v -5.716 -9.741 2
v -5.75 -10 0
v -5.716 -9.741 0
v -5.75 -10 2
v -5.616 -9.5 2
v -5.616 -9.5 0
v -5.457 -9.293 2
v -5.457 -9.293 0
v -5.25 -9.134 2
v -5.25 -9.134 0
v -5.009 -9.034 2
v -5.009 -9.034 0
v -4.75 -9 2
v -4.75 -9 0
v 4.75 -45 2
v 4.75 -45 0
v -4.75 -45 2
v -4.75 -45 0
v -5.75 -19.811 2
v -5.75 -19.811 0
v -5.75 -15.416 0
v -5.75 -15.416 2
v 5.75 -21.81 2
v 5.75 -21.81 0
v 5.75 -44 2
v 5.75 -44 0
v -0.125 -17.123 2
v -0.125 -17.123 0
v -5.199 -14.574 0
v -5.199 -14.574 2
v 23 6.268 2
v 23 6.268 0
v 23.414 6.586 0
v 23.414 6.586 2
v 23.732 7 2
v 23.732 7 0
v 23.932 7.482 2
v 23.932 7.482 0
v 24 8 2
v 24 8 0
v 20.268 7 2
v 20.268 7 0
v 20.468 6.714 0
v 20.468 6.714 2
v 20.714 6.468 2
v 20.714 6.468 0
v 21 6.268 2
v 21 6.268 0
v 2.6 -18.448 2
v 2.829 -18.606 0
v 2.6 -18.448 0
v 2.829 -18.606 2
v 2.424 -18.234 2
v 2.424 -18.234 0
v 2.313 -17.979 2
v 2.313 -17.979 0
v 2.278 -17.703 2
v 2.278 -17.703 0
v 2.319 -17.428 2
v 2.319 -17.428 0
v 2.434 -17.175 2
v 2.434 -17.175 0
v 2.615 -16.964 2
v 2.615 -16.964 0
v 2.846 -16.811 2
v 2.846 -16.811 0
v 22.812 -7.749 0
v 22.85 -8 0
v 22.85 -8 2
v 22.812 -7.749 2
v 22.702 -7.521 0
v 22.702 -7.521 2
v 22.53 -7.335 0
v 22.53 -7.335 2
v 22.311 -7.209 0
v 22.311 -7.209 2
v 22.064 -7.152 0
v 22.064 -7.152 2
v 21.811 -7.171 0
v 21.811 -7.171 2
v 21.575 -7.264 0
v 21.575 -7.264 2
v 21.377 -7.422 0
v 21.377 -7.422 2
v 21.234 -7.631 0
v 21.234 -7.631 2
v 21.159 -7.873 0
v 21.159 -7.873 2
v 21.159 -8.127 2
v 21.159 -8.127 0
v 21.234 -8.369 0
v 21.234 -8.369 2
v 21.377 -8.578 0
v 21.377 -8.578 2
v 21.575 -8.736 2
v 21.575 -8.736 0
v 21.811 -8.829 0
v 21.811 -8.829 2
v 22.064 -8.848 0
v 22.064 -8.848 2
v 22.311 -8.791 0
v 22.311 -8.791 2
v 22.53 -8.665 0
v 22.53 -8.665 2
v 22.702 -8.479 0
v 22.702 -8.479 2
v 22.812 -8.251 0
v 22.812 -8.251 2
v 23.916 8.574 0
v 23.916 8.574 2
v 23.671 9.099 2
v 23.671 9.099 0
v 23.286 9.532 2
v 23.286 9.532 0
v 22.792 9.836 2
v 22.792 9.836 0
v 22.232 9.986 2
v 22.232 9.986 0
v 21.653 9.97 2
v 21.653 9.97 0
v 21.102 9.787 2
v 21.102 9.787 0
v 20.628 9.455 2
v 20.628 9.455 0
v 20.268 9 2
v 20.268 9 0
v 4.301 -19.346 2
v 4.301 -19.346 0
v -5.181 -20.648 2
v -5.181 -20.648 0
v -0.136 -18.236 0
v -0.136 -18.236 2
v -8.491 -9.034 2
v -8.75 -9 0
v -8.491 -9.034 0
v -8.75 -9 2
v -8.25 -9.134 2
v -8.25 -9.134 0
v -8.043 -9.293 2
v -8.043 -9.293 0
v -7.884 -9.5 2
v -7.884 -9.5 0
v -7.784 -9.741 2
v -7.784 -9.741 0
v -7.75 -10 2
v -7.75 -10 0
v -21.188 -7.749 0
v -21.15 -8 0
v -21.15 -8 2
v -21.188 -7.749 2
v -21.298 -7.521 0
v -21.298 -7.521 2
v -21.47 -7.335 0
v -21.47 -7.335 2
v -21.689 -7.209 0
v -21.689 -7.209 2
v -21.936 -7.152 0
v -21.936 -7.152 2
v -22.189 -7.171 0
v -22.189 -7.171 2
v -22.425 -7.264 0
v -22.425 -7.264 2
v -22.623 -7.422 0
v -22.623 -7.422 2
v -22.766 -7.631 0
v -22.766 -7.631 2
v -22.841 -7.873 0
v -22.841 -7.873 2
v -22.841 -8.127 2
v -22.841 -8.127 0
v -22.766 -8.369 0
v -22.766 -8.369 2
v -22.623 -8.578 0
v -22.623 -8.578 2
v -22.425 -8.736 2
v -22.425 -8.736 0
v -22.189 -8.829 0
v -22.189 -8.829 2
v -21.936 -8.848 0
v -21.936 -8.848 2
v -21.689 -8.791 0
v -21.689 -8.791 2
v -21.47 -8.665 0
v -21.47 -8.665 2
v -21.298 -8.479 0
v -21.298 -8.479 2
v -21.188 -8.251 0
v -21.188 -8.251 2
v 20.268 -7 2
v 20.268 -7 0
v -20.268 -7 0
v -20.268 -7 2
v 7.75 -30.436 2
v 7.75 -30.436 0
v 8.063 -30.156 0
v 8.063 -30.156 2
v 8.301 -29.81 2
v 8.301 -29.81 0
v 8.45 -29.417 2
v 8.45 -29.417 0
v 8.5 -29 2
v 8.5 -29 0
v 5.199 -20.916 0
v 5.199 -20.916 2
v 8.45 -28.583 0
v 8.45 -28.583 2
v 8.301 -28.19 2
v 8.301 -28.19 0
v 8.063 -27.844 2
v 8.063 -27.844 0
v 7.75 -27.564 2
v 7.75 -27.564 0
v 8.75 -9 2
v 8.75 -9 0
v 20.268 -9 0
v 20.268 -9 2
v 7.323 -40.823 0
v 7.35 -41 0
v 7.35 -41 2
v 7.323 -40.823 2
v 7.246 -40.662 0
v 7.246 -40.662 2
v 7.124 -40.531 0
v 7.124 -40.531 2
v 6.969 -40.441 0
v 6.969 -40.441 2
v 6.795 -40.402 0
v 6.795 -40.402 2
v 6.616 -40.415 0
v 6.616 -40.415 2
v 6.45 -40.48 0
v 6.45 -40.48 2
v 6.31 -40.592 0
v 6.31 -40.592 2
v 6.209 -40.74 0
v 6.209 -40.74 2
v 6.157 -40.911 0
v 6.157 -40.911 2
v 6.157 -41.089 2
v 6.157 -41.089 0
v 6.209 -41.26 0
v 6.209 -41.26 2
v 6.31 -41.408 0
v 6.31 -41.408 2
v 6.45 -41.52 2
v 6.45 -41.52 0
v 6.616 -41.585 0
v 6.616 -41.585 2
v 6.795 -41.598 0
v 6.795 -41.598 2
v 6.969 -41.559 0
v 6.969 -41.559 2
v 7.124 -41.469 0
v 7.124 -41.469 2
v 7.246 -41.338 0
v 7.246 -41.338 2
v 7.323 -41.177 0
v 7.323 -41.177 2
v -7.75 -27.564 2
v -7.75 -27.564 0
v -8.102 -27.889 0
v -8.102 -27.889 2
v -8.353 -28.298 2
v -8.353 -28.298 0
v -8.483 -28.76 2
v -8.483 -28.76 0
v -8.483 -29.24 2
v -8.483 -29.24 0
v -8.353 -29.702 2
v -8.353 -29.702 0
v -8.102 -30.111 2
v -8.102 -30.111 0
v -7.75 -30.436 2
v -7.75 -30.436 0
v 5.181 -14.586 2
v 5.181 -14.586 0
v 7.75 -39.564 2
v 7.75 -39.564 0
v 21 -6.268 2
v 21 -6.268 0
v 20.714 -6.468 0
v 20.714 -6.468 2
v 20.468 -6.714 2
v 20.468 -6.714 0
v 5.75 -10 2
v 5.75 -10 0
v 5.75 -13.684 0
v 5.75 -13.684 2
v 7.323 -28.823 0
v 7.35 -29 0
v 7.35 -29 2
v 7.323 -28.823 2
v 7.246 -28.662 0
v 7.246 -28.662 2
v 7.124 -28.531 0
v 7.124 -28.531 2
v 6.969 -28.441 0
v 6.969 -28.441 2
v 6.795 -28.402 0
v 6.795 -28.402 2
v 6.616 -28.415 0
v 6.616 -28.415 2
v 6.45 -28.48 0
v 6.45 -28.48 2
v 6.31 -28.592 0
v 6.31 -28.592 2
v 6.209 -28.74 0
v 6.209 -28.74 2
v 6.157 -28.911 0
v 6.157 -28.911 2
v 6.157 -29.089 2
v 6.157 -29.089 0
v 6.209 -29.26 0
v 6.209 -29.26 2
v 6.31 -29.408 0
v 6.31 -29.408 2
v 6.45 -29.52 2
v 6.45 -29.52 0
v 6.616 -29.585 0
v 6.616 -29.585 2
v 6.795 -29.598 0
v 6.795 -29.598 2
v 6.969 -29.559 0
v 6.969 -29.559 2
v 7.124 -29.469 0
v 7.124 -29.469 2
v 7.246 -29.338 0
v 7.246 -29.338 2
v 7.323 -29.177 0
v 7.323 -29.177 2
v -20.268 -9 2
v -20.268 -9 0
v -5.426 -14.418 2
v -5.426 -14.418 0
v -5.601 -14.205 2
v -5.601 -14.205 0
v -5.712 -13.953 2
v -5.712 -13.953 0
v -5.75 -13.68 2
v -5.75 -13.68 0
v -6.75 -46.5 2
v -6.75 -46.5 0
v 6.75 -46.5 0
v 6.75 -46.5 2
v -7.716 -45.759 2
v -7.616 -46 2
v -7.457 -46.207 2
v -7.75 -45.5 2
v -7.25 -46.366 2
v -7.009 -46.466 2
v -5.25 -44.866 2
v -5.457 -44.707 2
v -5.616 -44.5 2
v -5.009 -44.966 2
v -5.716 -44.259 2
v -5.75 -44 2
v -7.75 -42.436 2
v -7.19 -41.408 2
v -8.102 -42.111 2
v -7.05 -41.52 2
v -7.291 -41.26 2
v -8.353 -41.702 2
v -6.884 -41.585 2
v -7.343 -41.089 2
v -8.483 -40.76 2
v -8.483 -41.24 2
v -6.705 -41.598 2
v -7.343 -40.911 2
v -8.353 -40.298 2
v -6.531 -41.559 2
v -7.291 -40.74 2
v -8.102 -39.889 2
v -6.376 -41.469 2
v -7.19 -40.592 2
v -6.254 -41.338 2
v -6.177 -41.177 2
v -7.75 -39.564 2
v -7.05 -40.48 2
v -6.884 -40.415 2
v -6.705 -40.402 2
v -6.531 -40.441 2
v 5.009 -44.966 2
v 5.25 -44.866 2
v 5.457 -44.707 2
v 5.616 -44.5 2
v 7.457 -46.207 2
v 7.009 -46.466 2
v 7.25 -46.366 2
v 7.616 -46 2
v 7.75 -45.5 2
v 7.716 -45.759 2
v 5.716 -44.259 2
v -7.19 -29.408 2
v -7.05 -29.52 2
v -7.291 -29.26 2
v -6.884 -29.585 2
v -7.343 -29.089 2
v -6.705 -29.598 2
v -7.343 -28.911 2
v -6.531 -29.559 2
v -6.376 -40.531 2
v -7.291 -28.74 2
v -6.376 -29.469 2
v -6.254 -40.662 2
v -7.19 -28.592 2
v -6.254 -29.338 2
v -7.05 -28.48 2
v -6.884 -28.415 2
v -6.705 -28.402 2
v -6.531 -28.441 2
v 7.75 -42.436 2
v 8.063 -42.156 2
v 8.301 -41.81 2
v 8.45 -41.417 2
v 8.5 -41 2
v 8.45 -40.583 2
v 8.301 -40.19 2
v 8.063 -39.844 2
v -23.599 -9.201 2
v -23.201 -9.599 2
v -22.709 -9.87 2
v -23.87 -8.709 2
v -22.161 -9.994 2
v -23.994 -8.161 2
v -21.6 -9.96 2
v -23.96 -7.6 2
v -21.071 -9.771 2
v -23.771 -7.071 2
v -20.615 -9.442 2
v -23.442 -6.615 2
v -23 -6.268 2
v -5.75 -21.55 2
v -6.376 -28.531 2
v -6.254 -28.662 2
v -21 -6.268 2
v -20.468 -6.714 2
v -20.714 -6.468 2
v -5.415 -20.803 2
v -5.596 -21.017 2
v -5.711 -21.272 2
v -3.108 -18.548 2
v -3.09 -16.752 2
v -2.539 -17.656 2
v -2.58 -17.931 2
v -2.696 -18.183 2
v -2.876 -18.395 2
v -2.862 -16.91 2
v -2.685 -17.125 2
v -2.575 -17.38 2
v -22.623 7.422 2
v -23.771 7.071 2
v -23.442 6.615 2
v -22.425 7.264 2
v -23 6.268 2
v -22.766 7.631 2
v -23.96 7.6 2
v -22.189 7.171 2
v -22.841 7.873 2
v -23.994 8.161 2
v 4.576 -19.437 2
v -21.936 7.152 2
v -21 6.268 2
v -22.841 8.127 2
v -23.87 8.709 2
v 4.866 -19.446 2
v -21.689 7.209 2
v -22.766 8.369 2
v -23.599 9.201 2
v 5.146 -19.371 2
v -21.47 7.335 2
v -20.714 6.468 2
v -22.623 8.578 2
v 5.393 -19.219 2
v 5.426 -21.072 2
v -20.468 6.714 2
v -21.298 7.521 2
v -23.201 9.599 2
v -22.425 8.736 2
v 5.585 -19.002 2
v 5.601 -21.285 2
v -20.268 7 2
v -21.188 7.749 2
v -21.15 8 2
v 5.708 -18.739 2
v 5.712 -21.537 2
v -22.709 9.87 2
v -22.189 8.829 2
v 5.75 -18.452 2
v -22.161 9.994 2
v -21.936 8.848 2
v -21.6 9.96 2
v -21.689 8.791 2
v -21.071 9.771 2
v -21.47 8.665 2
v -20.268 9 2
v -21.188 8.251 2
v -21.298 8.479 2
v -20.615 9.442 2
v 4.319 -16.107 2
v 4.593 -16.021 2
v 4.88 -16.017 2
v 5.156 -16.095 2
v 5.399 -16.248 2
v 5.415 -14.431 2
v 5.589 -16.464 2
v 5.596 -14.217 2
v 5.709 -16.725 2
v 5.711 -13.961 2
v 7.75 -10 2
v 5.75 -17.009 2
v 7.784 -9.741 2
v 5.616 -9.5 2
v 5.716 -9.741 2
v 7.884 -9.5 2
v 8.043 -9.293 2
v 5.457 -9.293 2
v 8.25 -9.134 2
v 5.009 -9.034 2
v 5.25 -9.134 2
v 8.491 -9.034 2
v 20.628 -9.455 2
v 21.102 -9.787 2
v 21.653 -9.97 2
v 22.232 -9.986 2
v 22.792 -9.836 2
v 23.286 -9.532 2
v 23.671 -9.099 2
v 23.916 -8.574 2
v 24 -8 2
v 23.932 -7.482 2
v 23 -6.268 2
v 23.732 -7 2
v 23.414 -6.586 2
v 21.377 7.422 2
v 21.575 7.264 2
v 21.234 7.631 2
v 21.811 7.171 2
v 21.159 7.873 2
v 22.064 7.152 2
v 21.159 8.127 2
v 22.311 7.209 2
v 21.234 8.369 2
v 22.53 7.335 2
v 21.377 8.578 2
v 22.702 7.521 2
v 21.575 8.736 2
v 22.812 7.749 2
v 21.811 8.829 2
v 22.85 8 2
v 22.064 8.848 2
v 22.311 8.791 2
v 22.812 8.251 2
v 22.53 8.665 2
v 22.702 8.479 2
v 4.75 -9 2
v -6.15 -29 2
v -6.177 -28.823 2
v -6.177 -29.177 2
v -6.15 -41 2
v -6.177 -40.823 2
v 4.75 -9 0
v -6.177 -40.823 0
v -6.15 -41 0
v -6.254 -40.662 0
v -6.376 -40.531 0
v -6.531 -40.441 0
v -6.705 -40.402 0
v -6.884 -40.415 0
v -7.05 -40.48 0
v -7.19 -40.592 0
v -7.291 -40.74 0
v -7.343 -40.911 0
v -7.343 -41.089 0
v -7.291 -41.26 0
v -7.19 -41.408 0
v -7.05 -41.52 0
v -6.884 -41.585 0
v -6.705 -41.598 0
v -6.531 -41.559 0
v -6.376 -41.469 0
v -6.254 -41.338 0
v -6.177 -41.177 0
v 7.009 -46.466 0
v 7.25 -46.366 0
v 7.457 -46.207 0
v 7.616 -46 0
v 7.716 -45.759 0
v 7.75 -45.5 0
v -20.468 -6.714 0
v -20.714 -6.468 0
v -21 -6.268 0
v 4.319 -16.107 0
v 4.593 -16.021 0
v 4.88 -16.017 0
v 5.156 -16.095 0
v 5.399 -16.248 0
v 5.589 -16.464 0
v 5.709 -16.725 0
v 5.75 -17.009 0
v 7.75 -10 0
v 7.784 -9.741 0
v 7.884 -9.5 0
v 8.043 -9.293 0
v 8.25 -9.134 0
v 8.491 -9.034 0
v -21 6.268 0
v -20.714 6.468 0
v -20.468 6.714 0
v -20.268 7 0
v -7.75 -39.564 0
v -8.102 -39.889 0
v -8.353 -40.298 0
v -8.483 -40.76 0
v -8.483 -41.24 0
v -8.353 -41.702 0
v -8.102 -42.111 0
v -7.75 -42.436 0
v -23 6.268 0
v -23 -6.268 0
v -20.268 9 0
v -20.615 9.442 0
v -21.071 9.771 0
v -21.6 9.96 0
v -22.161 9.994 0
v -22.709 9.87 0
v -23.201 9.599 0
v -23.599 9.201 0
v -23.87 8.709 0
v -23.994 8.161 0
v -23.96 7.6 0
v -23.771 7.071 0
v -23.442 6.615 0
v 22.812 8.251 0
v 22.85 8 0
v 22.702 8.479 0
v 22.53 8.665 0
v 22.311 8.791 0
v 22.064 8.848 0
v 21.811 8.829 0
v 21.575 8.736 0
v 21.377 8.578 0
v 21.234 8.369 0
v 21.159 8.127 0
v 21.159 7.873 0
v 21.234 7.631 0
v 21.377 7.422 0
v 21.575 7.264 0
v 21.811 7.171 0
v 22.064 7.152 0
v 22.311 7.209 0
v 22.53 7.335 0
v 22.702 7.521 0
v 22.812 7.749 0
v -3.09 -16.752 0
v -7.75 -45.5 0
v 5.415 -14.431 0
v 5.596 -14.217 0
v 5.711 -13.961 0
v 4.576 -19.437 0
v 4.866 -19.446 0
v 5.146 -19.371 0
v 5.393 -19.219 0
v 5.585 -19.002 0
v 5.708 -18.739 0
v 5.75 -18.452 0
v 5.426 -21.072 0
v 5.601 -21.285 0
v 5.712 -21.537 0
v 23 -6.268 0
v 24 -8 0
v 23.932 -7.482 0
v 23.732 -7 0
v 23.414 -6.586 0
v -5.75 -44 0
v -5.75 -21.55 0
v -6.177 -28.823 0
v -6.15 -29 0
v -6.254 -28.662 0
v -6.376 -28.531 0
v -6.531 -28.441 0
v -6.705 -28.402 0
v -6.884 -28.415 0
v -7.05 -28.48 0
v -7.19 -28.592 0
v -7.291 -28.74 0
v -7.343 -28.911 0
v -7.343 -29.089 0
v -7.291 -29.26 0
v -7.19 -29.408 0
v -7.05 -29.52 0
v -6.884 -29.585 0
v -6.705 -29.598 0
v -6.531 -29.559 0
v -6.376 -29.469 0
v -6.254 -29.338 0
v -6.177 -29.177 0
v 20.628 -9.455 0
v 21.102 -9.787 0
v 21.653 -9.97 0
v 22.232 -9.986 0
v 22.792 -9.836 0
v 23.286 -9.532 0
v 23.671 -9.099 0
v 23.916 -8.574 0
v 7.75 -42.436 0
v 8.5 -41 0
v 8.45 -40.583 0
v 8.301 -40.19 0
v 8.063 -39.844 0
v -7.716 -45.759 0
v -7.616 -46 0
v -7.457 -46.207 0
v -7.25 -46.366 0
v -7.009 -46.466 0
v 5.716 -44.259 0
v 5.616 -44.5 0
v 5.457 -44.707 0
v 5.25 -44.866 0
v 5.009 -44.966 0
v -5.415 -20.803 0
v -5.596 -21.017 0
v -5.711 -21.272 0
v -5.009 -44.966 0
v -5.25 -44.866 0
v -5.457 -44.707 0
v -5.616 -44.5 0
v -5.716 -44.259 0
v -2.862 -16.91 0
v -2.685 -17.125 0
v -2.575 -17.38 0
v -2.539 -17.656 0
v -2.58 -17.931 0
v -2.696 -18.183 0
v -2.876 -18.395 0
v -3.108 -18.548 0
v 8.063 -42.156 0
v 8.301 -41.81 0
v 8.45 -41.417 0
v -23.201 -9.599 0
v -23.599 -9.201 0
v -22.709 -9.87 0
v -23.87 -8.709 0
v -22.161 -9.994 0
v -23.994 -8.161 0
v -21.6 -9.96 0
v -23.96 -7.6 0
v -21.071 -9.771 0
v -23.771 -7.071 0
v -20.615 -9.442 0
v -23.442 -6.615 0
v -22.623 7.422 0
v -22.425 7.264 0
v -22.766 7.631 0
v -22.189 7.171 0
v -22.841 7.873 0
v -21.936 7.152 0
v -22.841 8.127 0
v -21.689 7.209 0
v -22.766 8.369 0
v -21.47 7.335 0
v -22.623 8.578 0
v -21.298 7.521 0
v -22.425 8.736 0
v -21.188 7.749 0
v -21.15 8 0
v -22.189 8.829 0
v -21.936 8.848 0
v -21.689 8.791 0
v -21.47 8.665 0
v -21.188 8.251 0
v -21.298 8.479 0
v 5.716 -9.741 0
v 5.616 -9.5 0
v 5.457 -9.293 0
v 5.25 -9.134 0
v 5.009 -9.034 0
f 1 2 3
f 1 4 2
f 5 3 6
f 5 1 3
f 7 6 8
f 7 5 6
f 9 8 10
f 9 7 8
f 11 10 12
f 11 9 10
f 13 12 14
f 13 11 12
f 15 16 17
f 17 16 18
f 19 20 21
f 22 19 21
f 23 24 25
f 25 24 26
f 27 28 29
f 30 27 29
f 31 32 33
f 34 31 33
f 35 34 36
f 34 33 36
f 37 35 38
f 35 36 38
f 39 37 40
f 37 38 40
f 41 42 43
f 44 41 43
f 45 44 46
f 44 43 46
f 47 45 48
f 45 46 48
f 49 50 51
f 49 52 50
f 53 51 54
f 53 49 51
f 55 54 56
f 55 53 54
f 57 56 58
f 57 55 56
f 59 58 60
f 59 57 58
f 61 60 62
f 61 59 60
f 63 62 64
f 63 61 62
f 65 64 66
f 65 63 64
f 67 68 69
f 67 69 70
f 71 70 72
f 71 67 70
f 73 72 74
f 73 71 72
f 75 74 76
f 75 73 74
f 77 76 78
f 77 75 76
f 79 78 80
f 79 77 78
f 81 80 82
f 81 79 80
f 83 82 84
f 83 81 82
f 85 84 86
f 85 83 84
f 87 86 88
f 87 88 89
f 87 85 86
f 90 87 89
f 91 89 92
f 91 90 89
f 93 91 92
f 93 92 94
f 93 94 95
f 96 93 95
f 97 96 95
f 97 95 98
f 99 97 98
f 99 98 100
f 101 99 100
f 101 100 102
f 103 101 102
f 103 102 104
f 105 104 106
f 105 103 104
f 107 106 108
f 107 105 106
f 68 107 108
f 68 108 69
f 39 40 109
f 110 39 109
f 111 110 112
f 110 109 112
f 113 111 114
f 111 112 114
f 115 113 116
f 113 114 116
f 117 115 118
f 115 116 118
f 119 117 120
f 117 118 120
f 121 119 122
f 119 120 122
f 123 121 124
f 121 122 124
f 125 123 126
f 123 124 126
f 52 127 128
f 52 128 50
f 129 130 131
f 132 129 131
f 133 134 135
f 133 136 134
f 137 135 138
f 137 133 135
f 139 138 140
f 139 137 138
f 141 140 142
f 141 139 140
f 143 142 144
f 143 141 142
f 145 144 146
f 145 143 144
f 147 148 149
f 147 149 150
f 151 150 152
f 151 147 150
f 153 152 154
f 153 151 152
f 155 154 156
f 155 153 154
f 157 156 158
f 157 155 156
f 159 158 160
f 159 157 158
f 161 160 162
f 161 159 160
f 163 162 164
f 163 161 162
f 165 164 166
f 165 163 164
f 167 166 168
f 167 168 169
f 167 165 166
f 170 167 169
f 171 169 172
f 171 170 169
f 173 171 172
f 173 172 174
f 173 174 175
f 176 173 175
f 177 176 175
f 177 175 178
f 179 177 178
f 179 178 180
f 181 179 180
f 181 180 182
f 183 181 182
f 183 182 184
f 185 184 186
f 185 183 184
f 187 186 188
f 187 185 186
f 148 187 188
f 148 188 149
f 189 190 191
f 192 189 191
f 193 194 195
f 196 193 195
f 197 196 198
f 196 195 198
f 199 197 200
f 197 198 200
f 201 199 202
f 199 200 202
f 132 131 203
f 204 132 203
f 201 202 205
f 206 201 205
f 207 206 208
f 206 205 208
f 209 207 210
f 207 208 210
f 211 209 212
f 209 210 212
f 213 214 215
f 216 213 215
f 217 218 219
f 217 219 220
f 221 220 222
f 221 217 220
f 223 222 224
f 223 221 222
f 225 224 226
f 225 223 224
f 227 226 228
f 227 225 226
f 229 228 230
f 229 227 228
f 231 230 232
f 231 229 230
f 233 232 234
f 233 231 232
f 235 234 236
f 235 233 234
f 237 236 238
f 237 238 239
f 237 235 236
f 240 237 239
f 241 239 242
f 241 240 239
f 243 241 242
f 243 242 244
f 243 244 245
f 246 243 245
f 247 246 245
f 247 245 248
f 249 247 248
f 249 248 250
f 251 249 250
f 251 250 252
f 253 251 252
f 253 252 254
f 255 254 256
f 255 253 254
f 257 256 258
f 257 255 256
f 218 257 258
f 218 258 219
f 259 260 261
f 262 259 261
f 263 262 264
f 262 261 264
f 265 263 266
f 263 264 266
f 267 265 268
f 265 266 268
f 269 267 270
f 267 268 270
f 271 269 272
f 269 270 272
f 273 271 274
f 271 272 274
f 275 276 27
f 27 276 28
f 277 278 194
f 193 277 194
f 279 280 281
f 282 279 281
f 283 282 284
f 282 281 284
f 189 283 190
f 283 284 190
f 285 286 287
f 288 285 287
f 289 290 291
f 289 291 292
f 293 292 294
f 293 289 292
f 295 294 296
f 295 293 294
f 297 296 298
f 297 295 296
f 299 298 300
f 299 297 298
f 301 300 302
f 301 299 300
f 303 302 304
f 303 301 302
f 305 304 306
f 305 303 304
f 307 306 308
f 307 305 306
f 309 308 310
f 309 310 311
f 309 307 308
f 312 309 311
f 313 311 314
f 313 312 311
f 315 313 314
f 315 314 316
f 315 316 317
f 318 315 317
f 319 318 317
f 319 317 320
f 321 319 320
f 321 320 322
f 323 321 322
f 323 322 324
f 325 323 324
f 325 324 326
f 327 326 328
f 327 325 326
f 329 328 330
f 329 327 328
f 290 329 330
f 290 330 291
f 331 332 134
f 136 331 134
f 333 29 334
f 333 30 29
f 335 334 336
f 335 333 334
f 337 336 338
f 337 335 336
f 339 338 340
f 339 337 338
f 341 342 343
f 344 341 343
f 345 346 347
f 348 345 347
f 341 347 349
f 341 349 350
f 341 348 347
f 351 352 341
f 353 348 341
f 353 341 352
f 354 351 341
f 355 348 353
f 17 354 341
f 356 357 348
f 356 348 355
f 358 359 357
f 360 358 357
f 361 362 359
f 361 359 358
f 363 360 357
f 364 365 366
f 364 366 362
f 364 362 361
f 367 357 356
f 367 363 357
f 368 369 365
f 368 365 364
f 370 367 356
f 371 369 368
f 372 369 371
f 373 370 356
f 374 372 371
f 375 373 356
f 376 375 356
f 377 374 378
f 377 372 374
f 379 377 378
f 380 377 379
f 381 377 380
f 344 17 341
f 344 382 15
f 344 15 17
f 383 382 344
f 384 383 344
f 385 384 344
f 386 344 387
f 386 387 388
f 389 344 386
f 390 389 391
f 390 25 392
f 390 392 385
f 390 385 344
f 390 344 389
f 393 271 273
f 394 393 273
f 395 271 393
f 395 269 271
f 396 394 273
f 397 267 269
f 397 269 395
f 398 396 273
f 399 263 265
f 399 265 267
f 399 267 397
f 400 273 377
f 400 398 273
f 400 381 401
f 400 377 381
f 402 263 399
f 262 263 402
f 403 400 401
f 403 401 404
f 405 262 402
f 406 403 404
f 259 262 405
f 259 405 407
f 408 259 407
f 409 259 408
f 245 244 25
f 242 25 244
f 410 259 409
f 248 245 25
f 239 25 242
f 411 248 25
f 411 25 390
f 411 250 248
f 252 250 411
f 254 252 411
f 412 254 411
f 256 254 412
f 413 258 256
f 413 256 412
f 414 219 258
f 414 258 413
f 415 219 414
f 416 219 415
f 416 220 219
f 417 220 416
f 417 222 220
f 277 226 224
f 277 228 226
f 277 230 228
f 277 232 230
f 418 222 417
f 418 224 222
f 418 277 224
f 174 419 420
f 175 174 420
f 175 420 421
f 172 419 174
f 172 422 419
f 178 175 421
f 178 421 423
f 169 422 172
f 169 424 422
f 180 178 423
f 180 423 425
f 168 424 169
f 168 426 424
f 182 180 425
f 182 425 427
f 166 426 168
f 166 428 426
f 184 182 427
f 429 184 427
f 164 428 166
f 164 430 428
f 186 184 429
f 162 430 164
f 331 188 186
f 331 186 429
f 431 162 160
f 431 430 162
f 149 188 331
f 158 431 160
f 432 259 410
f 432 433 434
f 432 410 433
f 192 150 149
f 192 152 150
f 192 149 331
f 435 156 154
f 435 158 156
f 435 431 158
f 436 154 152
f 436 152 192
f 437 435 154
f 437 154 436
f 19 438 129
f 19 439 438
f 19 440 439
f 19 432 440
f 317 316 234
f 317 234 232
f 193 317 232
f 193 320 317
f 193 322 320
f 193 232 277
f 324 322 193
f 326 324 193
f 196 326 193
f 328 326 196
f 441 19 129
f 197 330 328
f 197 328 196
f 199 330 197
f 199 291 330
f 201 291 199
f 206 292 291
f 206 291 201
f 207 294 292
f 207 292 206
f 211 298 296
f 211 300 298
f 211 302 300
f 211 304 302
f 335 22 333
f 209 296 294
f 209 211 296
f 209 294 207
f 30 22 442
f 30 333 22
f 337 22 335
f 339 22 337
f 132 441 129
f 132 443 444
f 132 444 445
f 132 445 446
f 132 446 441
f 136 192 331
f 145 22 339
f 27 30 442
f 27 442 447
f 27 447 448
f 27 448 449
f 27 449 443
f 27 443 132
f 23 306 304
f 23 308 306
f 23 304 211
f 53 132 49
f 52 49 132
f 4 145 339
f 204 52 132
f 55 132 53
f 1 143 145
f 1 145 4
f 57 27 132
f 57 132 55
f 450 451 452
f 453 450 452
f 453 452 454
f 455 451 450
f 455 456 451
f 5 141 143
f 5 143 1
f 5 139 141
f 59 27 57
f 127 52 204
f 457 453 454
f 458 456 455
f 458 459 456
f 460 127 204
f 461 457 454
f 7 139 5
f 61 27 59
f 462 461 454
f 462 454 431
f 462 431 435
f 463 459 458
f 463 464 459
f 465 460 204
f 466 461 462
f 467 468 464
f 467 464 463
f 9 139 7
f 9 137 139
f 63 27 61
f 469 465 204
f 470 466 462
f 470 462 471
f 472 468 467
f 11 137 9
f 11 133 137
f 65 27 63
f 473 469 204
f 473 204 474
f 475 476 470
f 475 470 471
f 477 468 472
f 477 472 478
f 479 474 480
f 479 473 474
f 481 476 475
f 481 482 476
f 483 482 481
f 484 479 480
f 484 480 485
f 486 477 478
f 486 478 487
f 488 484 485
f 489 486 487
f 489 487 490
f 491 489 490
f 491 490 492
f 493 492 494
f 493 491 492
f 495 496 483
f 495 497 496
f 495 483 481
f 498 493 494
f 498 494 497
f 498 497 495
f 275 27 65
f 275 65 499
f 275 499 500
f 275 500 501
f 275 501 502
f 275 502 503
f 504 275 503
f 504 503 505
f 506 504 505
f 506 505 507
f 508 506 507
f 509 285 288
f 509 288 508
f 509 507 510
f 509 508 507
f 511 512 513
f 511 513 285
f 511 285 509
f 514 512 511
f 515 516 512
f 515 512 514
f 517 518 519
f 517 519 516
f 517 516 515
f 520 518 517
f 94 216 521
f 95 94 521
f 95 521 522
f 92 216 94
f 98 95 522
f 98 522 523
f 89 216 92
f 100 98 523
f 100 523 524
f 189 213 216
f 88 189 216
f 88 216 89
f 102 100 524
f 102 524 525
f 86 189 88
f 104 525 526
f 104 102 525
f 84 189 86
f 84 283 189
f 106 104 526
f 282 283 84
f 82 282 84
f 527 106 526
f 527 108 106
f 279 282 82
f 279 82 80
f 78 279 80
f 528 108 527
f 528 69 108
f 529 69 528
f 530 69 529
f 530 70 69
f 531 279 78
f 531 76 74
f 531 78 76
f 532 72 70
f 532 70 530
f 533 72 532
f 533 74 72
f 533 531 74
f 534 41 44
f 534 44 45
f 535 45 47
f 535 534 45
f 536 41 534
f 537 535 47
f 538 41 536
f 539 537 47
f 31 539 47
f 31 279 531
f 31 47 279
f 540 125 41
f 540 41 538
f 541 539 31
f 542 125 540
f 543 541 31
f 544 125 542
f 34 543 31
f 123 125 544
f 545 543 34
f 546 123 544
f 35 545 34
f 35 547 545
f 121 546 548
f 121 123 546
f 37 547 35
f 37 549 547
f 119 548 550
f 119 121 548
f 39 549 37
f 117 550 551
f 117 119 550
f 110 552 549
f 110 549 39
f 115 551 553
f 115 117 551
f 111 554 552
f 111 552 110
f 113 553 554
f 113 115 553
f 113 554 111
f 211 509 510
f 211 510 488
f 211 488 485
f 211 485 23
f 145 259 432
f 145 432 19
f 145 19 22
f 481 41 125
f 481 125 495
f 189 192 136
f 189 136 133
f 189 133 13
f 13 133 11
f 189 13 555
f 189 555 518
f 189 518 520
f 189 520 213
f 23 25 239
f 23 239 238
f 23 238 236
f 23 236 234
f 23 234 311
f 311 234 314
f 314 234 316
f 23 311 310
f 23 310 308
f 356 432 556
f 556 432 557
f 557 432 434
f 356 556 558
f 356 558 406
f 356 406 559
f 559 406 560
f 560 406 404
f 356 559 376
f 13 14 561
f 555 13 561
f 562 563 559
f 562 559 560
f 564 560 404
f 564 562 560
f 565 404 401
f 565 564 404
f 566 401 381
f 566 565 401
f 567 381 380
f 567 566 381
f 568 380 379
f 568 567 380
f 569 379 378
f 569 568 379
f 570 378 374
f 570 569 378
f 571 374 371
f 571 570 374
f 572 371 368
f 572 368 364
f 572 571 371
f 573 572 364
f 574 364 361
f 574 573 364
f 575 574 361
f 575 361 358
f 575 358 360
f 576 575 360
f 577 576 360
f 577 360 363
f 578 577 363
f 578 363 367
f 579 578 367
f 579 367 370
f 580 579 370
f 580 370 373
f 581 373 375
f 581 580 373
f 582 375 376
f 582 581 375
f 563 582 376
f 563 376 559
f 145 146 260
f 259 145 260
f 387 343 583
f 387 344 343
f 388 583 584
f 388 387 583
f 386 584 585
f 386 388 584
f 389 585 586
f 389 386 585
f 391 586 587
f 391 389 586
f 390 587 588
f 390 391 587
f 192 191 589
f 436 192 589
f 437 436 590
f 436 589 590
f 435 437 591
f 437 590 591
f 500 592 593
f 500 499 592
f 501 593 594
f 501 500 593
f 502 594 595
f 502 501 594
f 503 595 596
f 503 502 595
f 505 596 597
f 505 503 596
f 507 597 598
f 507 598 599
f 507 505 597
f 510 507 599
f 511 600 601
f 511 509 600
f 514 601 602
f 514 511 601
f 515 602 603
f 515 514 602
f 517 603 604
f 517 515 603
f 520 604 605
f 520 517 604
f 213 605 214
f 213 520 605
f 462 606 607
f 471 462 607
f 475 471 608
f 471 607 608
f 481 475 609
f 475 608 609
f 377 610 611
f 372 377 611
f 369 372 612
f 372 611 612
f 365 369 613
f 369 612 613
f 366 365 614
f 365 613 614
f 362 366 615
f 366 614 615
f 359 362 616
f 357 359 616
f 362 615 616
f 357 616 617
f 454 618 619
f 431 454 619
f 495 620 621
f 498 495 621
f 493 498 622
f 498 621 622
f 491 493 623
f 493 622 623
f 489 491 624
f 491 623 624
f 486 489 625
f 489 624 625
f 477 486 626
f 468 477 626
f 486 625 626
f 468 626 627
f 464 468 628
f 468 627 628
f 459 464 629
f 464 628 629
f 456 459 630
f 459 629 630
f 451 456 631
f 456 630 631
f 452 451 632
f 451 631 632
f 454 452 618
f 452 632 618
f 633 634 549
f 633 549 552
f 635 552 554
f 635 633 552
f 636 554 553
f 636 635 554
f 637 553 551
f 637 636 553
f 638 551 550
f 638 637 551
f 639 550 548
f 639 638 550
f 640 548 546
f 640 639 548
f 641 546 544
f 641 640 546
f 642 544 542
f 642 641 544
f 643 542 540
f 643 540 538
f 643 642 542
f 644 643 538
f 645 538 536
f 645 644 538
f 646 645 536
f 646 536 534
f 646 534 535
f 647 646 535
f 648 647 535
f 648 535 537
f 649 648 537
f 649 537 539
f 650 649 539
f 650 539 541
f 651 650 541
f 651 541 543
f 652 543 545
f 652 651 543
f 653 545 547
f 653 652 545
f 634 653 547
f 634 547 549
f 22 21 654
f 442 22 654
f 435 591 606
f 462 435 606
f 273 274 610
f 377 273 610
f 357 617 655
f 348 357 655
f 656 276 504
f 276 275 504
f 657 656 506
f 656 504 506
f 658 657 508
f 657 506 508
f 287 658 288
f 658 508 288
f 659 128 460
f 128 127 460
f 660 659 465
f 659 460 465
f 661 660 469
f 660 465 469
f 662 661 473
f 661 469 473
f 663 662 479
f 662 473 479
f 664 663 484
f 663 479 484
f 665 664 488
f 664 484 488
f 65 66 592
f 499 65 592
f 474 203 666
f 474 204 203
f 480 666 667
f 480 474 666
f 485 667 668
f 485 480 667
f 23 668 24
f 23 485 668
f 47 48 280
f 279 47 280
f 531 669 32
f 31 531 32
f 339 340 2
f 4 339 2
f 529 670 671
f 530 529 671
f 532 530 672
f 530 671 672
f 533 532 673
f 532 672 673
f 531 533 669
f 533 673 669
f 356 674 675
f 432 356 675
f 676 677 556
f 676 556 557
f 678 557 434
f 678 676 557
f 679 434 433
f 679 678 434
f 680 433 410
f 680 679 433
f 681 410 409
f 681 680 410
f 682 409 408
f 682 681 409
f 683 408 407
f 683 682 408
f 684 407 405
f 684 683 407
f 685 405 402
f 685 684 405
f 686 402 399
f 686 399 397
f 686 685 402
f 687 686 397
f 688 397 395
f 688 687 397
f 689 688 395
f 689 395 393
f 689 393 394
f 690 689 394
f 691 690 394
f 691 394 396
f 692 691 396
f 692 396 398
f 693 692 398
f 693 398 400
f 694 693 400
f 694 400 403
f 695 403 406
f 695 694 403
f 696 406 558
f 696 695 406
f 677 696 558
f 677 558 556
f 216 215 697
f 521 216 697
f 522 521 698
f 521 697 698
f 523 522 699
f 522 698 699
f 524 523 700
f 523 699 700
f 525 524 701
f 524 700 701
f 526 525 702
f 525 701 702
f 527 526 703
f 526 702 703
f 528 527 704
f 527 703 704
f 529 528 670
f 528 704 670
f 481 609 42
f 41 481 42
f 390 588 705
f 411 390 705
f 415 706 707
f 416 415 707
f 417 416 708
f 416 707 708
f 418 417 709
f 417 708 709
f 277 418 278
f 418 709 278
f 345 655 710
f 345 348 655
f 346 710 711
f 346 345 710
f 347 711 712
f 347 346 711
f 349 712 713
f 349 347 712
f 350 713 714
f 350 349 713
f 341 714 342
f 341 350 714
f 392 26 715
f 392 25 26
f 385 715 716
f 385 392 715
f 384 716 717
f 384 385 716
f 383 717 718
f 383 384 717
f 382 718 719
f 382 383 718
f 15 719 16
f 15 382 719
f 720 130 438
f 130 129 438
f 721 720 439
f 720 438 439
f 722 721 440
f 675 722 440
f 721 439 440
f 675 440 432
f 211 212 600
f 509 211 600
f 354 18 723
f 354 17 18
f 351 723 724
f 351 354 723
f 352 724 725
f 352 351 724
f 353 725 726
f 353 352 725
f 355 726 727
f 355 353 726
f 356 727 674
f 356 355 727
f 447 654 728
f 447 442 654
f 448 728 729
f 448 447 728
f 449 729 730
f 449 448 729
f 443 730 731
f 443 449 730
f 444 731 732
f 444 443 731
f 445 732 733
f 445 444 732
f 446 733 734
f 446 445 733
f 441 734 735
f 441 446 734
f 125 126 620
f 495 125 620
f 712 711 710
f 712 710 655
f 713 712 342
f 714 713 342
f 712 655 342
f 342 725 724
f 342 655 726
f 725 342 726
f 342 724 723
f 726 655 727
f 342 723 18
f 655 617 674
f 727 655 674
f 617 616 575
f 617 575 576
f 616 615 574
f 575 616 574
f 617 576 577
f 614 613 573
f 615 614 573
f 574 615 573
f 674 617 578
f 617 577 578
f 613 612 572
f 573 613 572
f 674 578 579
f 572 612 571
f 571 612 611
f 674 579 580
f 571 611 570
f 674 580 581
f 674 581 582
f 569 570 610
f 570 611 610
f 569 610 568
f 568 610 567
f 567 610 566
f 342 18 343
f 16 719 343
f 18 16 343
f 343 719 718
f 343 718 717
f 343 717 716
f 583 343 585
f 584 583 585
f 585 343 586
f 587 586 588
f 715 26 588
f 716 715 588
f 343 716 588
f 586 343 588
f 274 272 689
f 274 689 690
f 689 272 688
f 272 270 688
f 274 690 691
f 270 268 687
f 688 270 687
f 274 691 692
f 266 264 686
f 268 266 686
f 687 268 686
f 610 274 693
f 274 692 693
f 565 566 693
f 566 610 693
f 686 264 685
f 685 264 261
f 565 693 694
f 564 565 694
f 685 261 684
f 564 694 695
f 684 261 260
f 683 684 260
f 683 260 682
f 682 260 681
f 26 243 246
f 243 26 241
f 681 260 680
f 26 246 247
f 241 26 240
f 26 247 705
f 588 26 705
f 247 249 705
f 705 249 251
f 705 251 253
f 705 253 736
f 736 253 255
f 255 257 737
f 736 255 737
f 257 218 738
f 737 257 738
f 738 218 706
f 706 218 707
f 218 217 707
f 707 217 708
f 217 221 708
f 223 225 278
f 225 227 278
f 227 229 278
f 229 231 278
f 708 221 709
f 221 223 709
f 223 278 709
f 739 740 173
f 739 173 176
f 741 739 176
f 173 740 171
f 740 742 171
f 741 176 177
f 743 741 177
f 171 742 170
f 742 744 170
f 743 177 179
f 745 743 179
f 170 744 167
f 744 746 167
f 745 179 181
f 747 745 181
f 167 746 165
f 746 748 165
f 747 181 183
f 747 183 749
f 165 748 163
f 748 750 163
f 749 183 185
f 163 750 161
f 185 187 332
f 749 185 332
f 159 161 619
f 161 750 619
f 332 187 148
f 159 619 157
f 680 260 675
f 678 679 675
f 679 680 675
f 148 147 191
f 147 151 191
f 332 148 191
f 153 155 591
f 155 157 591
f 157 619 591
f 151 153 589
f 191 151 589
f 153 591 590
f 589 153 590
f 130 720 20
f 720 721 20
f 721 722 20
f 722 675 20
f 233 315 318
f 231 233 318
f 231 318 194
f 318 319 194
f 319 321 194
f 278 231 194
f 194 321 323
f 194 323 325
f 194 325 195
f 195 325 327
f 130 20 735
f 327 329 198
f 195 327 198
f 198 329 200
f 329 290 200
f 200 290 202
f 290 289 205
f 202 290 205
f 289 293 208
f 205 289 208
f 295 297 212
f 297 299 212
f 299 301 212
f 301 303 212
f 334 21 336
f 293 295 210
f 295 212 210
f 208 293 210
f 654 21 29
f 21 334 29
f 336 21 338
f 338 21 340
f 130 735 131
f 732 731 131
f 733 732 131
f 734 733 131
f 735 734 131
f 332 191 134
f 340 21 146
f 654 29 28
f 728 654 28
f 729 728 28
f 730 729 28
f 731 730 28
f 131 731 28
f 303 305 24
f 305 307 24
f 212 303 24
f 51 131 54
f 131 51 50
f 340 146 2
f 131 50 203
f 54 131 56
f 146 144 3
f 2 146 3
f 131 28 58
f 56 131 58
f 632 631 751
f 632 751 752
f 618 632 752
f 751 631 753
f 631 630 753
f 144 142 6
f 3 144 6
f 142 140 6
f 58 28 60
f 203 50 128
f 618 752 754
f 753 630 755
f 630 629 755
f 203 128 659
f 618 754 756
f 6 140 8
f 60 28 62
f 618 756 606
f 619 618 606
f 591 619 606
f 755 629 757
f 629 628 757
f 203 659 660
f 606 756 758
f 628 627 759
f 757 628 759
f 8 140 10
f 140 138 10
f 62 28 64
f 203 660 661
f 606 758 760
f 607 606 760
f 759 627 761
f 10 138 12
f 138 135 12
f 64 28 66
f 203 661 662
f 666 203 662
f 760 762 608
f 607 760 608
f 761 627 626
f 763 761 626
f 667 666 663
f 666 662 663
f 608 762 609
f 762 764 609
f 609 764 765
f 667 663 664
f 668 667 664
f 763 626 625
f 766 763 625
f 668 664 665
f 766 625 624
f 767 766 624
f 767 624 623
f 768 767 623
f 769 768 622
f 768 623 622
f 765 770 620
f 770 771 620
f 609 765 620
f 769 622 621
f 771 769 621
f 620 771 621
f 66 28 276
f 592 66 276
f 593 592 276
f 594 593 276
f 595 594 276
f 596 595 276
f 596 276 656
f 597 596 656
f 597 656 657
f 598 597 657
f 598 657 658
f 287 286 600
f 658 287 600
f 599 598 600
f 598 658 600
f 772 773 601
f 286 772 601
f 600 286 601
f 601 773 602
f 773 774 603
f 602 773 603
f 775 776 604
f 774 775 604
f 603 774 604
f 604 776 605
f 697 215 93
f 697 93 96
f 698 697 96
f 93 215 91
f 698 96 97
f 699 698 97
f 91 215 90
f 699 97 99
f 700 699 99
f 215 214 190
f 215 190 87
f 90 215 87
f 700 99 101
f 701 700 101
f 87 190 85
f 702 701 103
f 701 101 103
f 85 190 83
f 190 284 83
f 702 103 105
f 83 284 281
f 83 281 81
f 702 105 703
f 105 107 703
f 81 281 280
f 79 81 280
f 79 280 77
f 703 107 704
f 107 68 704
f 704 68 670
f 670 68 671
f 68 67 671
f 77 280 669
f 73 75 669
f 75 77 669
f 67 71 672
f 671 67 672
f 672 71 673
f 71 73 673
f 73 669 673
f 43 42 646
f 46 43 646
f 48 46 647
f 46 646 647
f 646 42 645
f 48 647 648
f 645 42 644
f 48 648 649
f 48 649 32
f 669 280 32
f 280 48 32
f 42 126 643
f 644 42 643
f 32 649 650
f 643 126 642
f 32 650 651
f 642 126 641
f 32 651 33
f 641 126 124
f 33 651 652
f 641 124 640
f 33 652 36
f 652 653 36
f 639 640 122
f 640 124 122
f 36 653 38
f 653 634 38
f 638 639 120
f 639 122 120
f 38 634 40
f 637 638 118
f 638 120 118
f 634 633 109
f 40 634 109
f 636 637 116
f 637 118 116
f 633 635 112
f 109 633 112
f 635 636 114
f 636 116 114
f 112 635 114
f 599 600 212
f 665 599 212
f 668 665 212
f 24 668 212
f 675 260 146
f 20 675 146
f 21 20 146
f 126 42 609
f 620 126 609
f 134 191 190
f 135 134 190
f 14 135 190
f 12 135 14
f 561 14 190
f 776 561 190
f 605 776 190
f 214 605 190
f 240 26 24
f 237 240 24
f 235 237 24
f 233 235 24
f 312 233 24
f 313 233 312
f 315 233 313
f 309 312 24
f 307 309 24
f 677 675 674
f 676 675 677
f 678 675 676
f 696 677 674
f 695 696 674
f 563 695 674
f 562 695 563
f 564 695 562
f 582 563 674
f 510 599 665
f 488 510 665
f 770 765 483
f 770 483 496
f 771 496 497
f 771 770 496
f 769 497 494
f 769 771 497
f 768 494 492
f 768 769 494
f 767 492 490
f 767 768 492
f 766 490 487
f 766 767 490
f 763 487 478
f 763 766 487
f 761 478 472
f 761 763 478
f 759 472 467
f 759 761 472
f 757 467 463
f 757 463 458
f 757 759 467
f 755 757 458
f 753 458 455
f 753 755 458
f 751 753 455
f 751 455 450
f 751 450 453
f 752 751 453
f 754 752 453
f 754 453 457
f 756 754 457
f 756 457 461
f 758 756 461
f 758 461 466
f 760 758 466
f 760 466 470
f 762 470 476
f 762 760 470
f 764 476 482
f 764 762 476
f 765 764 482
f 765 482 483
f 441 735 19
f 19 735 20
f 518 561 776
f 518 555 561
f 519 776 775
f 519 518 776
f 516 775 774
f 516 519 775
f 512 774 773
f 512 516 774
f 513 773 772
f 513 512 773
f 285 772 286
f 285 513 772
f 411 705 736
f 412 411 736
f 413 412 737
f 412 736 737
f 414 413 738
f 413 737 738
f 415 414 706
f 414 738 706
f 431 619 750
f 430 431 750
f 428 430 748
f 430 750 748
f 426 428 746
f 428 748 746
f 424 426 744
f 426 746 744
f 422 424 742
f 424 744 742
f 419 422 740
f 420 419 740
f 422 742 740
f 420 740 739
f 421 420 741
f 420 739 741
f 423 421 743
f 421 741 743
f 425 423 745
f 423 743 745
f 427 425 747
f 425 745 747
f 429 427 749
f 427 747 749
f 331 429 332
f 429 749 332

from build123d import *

# Parameters (mm, degrees)
F0_R     = 0.6
F0_R_2   = 0.85
F1_DEPTH = 2
F2_R     = 1


# Not quite as in the source:
# - a feature names something its author has since deleted; it is built from what else it names


with BuildPart() as f1:
    # F0 (on Top) → F1 (new body)
    with BuildSketch(Plane.XY):
        with BuildLine():
            ThreePointArc((-5.75, -27.5638593384), (-6.75, -27.25), (-7.75, -27.5638593384))
            Line((-7.75, -27.5638593384), (-7.75, -30.4361406616))
            ThreePointArc((-7.75, -30.4361406616), (-6.75, -30.75), (-5.75, -30.4361406616))
            Line((-5.75, -30.4361406616), (-5.75, -27.5638593384))
        make_face()
        with Locations((-6.75, -29)):
            Circle(F0_R, mode=Mode.SUBTRACT)
        with BuildLine():
            Line((-7.75, -30.4361406616), (-7.75, -27.5638593384))
            ThreePointArc((-7.75, -27.5638593384), (-8.5, -29), (-7.75, -30.4361406616))
        make_face()
        with BuildLine():
            ThreePointArc((-5.75, -30.4361406616), (-6.75, -30.75), (-7.75, -30.4361406616))
            Line((-7.75, -30.4361406616), (-7.75, -39.5638593384))
            ThreePointArc((-7.75, -39.5638593384), (-6.75, -39.25), (-5.75, -39.5638593384))
            Line((-5.75, -39.5638593384), (-5.75, -30.4361406616))
        make_face()
        with BuildLine():
            Line((-7.75, -42.4361406616), (-7.75, -39.5638593384))
            ThreePointArc((-7.75, -39.5638593384), (-8.5, -41), (-7.75, -42.4361406616))
        make_face()
        with BuildLine():
            ThreePointArc((-5.75, -39.5638593384), (-6.75, -39.25), (-7.75, -39.5638593384))
            Line((-7.75, -39.5638593384), (-7.75, -42.4361406616))
            ThreePointArc((-7.75, -42.4361406616), (-6.75, -42.75), (-5.75, -42.4361406616))
            Line((-5.75, -42.4361406616), (-5.75, -39.5638593384))
        make_face()
        with Locations((-6.75, -41)):
            Circle(F0_R, mode=Mode.SUBTRACT)
        with BuildLine():
            ThreePointArc((-5.75, -42.4361406616), (-6.75, -42.75), (-7.75, -42.4361406616))
            Line((-7.75, -42.4361406616), (-7.75, -46.5))
            Line((-7.75, -46.5), (7.75, -46.5))
            Line((7.75, -46.5), (7.75, -42.4361406616))
            ThreePointArc((7.75, -42.4361406616), (6.75, -42.75), (5.75, -42.4361406616))
            Line((5.75, -42.4361406616), (5.75, -45))
            Line((5.75, -45), (-5.75, -45))
            Line((-5.75, -45), (-5.75, -42.4361406616))
        make_face()
        with BuildLine():
            Line((7.75, -30.4361406616), (7.75, -27.5638593384))
            ThreePointArc((7.75, -27.5638593384), (6.75, -27.25), (5.75, -27.5638593384))
            Line((5.75, -27.5638593384), (5.75, -30.4361406616))
            ThreePointArc((5.75, -30.4361406616), (6.75, -30.75), (7.75, -30.4361406616))
        make_face()
        with Locations((6.75, -29)):
            Circle(F0_R, mode=Mode.SUBTRACT)
        with BuildLine():
            ThreePointArc((8.5, -29), (8.3012092057, -28.1899074127), (7.75, -27.5638593384))
            Line((7.75, -27.5638593384), (7.75, -30.4361406616))
            ThreePointArc((7.75, -30.4361406616), (8.3012092057, -29.8100925873), (8.5, -29))
        make_face()
        with BuildLine():
            Line((7.75, -39.5638593384), (7.75, -30.4361406616))
            ThreePointArc((7.75, -30.4361406616), (6.75, -30.75), (5.75, -30.4361406616))
            Line((5.75, -30.4361406616), (5.75, -39.5638593384))
            ThreePointArc((5.75, -39.5638593384), (6.75, -39.25), (7.75, -39.5638593384))
        make_face()
        with BuildLine():
            Line((7.75, -42.4361406616), (7.75, -39.5638593384))
            ThreePointArc((7.75, -39.5638593384), (6.75, -39.25), (5.75, -39.5638593384))
            Line((5.75, -39.5638593384), (5.75, -42.4361406616))
            ThreePointArc((5.75, -42.4361406616), (6.75, -42.75), (7.75, -42.4361406616))
        make_face()
        with Locations((6.75, -41)):
            Circle(F0_R, mode=Mode.SUBTRACT)
        with BuildLine():
            ThreePointArc((8.5, -41), (8.3012092057, -40.1899074127), (7.75, -39.5638593384))
            Line((7.75, -39.5638593384), (7.75, -42.4361406616))
            ThreePointArc((7.75, -42.4361406616), (8.3012092057, -41.8100925873), (8.5, -41))
        make_face()
        with BuildLine():
            ThreePointArc((-20, -8), (-20.0681483474, -8.5176380902), (-20.2679491924, -9))
            Line((-20.2679491924, -9), (-7.75, -9))
            Line((-7.75, -9), (-5.75, -9))
            Line((-5.75, -9), (5.75, -9))
            Line((5.75, -9), (7.75, -9))
            Line((7.75, -9), (20.2679491924, -9))
            ThreePointArc((20.2679491924, -9), (20, -8), (20.2679491924, -7))
            Line((20.2679491924, -7), (-20.2679491924, -7))
            ThreePointArc((-20.2679491924, -7), (-20.0681483474, -7.4823619098), (-20, -8))
        make_face()
        with BuildLine():
            ThreePointArc((24, -8), (23.7320508076, -7), (23, -6.2679491924))
            Line((23, -6.2679491924), (23, -9))
            Line((23, -9), (20.2679491924, -9))
            ThreePointArc((20.2679491924, -9), (22.5176380902, -9.9318516526), (24, -8))
        make_face()
        with BuildLine():
            ThreePointArc((23, -6.2679491924), (22, -6), (21, -6.2679491924))
            Line((21, -6.2679491924), (21, -7))
            Line((21, -7), (20.2679491924, -7))
            ThreePointArc((20.2679491924, -7), (20, -8), (20.2679491924, -9))
            Line((20.2679491924, -9), (23, -9))
            Line((23, -9), (23, -6.2679491924))
        make_face()
        with Locations((22, -8)):
            Circle(F0_R_2, mode=Mode.SUBTRACT)
        with BuildLine():
            ThreePointArc((23, 6.2679491924), (22, 6), (21, 6.2679491924))
            Line((21, 6.2679491924), (21, -6.2679491924))
            ThreePointArc((21, -6.2679491924), (22, -6), (23, -6.2679491924))
            Line((23, -6.2679491924), (23, 6.2679491924))
        make_face()
        with BuildLine():
            Line((21, -7), (21, -6.2679491924))
            ThreePointArc((21, -6.2679491924), (20.5857864376, -6.5857864376), (20.2679491924, -7))
            Line((20.2679491924, -7), (21, -7))
        make_face()
        with BuildLine():
            Line((21, 7), (20.2679491924, 7))
            ThreePointArc((20.2679491924, 7), (20.5857864376, 6.5857864376), (21, 6.2679491924))
            Line((21, 6.2679491924), (21, 7))
        make_face()
        with BuildLine():
            Line((23, 9), (20.2679491924, 9))
            ThreePointArc((20.2679491924, 9), (20, 8), (20.2679491924, 7))
            Line((20.2679491924, 7), (21, 7))
            Line((21, 7), (21, 6.2679491924))
            ThreePointArc((21, 6.2679491924), (22, 6), (23, 6.2679491924))
            Line((23, 6.2679491924), (23, 9))
        make_face()
        with Locations((22, 8)):
            Circle(F0_R_2, mode=Mode.SUBTRACT)
        with BuildLine():
            ThreePointArc((24, 8), (22.5176380902, 9.9318516526), (20.2679491924, 9))
            Line((20.2679491924, 9), (23, 9))
            Line((23, 9), (23, 6.2679491924))
            ThreePointArc((23, 6.2679491924), (23.7320508076, 7), (24, 8))
        make_face()
        with BuildLine():
            ThreePointArc((-20.2679491924, 9), (-20.0681483474, 8.5176380902), (-20, 8))
            ThreePointArc((-20, 8), (-20.0681483474, 7.4823619098), (-20.2679491924, 7))
            Line((-20.2679491924, 7), (20.2679491924, 7))
            ThreePointArc((20.2679491924, 7), (20, 8), (20.2679491924, 9))
            Line((20.2679491924, 9), (-20.2679491924, 9))
        make_face()
        with BuildLine():
            ThreePointArc((-21, -6.2679491924), (-22, -6), (-23, -6.2679491924))
            Line((-23, -6.2679491924), (-23, -9))
            Line((-23, -9), (-20.2679491924, -9))
            ThreePointArc((-20.2679491924, -9), (-20.0681483474, -8.5176380902), (-20, -8))
            ThreePointArc((-20, -8), (-20.0681483474, -7.4823619098), (-20.2679491924, -7))
            Line((-20.2679491924, -7), (-21, -7))
            Line((-21, -7), (-21, -6.2679491924))
        make_face()
        with Locations((-22, -8)):
            Circle(F0_R_2, mode=Mode.SUBTRACT)
        with BuildLine():
            Line((-23, -9), (-23, -6.2679491924))
            ThreePointArc((-23, -6.2679491924), (-23.4142135624, -9.4142135624), (-20.2679491924, -9))
            Line((-20.2679491924, -9), (-23, -9))
        make_face()
        with BuildLine():
            ThreePointArc((-20.2679491924, -7), (-20.5857864376, -6.5857864376), (-21, -6.2679491924))
            Line((-21, -6.2679491924), (-21, -7))
            Line((-21, -7), (-20.2679491924, -7))
        make_face()
        with BuildLine():
            Line((-23, 9), (-20.2679491924, 9))
            ThreePointArc((-20.2679491924, 9), (-23.4142135624, 9.4142135624), (-23, 6.2679491924))
            Line((-23, 6.2679491924), (-23, 9))
        make_face()
        with BuildLine():
            ThreePointArc((-20.2679491924, 7), (-20.0681483474, 7.4823619098), (-20, 8))
            ThreePointArc((-20, 8), (-20.0681483474, 8.5176380902), (-20.2679491924, 9))
            Line((-20.2679491924, 9), (-23, 9))
            Line((-23, 9), (-23, 6.2679491924))
            ThreePointArc((-23, 6.2679491924), (-22, 6), (-21, 6.2679491924))
            Line((-21, 6.2679491924), (-21, 7))
            Line((-21, 7), (-20.2679491924, 7))
        make_face()
        with Locations((-22, 8)):
            Circle(F0_R_2, mode=Mode.SUBTRACT)
        with BuildLine():
            ThreePointArc((-21, 6.2679491924), (-20.5857864376, 6.5857864376), (-20.2679491924, 7))
            Line((-20.2679491924, 7), (-21, 7))
            Line((-21, 7), (-21, 6.2679491924))
        make_face()
        with BuildLine():
            ThreePointArc((-21, 6.2679491924), (-22, 6), (-23, 6.2679491924))
            Line((-23, 6.2679491924), (-23, -6.2679491924))
            ThreePointArc((-23, -6.2679491924), (-22, -6), (-21, -6.2679491924))
            Line((-21, -6.2679491924), (-21, 6.2679491924))
        make_face()
        with BuildLine():
            Line((7.75, -9), (5.75, -9))
            Line((5.75, -9), (5.75, -14.3142581873))
            Line((5.75, -14.3142581873), (5.75, -15.422623174))
            Line((5.75, -15.422623174), (5.75, -20.073895466))
            Line((5.75, -20.073895466), (5.75, -21.1929723705))
            Line((5.75, -21.1929723705), (5.75, -27.5638593384))
            ThreePointArc((5.75, -27.5638593384), (6.75, -27.25), (7.75, -27.5638593384))
            Line((7.75, -27.5638593384), (7.75, -9))
        make_face()
        Polygon((5.75, -20.073895466), (1.0053343494, -17.6905184824), (-0.1362126115, -18.2361647275), (5.75, -21.1929723705), align=None)
        Polygon((5.75, -15.422623174), (5.75, -14.3142581873), (-0.125285608, -17.1225767595), (1.0053343494, -17.6905184824), align=None)
        Polygon((1.0053343494, -17.6905184824), (-0.125285608, -17.1225767595), (-1.2668325689, -17.6682230047), (-0.1362126115, -18.2361647275), align=None)
        Polygon((-5.75, -19.8111251883), (-5.75, -20.9194901751), (-0.1362126115, -18.2361647275), (-1.2668325689, -17.6682230047), align=None)
        Polygon((-0.125285608, -17.1225767595), (-5.75, -14.2971269157), (-5.75, -15.4162038202), (-1.2668325689, -17.6682230047), align=None)
        with BuildLine():
            Line((-5.75, -9), (-7.75, -9))
            Line((-7.75, -9), (-7.75, -27.5638593384))
            ThreePointArc((-7.75, -27.5638593384), (-6.75, -27.25), (-5.75, -27.5638593384))
            Line((-5.75, -27.5638593384), (-5.75, -20.9194901751))
            Line((-5.75, -20.9194901751), (-5.75, -19.8111251883))
            Line((-5.75, -19.8111251883), (-5.75, -15.4162038202))
            Line((-5.75, -15.4162038202), (-5.75, -14.2971269157))
            Line((-5.75, -14.2971269157), (-5.75, -9))
        make_face()
    extrude(amount=F1_DEPTH)

    # F2
    f2_edges = [f1.edges().sort_by_distance(p)[0] for p in [
        (-7.75, -46.5, 1),
        (7.75, -46.5, 1),
        (-5.75, -45, 1),
        (5.75, -45, 1),
        (-5.75, -20.91949, 1),
        (5.75, -21.192972, 1),
        (5.75, -20.073895, 1),
        (5.75, -15.422623, 1),
        (1.005334, -17.690518, 1),
        (-1.266833, -17.668223, 1),
        (-5.75, -14.297127, 1),
        (5.75, -14.314258, 1),
        (5.75, -9, 1),
        (-5.75, -9, 1),
        (-7.75, -9, 1),
        (7.75, -9, 1),
    ]]
    fillet(f2_edges, radius=F2_R)


solid = f1.part
